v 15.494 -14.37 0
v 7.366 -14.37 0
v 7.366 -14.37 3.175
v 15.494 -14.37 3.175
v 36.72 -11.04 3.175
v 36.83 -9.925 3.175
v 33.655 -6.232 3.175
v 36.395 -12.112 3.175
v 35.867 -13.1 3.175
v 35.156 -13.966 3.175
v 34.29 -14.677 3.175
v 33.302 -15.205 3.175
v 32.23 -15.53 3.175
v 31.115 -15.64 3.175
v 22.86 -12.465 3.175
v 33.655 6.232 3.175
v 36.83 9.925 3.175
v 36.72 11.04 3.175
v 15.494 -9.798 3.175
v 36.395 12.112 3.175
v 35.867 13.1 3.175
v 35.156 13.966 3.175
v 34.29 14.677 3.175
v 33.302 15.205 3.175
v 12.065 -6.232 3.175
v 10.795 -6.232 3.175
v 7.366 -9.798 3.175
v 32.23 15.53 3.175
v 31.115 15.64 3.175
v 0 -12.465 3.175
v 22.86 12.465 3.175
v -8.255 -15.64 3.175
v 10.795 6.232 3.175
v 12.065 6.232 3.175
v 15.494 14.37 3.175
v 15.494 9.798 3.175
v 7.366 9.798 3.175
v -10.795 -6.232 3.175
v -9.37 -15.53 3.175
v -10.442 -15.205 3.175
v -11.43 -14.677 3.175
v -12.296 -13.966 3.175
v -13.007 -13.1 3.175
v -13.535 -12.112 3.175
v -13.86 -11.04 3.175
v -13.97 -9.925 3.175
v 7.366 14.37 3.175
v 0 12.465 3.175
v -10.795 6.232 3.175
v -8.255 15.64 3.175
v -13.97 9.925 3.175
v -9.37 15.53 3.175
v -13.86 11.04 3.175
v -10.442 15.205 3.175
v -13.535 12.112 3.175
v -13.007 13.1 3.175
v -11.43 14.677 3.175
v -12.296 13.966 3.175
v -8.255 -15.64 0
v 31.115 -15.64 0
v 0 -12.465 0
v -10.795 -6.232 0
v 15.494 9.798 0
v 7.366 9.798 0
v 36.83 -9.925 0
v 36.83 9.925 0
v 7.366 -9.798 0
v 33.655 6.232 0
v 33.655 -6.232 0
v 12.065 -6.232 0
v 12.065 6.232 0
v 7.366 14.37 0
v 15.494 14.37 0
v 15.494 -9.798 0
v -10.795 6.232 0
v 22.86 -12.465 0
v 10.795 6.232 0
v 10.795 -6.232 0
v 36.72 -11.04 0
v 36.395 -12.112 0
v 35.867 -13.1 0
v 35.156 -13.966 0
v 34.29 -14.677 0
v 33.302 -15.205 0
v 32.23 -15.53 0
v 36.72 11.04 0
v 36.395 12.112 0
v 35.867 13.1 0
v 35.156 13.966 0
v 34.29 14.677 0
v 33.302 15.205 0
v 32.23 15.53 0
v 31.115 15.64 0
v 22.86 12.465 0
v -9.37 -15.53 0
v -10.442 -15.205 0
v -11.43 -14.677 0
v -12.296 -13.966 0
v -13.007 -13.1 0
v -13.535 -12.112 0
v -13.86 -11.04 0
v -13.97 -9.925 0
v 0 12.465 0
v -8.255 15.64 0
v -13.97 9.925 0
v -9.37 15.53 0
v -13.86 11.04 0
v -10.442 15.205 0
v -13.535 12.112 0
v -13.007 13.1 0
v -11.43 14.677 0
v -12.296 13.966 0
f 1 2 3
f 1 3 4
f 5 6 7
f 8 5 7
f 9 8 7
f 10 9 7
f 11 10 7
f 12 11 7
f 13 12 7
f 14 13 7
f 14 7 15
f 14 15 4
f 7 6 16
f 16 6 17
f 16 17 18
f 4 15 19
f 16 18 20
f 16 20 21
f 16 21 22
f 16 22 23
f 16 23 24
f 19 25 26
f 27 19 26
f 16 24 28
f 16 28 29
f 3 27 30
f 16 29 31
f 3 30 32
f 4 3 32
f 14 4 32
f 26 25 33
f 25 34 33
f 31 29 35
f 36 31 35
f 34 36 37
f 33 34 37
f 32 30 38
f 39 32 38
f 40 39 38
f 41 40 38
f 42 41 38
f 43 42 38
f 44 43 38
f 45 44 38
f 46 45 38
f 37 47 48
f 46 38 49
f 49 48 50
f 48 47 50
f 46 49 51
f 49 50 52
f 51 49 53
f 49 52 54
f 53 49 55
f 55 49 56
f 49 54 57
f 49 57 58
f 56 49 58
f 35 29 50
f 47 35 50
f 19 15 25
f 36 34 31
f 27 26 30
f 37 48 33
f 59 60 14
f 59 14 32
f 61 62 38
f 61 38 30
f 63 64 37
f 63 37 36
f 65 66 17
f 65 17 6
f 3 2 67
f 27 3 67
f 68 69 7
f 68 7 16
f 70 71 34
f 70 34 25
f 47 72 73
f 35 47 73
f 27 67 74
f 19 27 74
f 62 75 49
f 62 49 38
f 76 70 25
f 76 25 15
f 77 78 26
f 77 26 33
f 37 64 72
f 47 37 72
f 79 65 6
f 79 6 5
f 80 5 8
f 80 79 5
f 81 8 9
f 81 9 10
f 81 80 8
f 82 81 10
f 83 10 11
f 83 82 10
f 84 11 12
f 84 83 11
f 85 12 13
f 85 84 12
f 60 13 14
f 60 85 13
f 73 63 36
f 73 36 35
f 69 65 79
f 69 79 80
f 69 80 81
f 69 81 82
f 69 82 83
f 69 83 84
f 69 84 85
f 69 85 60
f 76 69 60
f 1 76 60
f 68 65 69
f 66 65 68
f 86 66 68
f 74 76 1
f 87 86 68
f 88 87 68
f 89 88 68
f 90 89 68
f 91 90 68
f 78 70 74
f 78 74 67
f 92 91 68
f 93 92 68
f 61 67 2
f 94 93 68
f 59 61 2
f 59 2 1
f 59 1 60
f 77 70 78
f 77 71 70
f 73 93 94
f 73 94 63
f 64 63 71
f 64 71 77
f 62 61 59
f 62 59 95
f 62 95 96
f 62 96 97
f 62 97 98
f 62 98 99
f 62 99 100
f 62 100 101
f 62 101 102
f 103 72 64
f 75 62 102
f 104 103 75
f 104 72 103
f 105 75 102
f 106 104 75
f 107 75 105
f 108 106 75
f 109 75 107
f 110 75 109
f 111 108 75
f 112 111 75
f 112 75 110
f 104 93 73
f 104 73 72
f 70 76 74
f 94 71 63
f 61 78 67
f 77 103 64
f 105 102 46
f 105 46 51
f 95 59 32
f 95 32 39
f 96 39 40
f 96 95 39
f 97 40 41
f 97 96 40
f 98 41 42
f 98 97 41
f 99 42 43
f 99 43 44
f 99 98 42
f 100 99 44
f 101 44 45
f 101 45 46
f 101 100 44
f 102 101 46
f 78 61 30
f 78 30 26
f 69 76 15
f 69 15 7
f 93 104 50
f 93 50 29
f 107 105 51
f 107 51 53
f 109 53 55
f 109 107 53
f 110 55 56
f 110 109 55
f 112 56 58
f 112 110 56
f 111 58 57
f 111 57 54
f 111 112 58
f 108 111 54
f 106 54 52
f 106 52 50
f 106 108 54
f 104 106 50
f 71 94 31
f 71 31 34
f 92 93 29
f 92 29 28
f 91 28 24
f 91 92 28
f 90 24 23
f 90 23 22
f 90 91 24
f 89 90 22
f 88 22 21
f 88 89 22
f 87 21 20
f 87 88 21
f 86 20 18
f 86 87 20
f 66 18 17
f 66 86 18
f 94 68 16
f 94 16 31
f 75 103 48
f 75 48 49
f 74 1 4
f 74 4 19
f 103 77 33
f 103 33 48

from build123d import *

# Parameters (mm, degrees)
SKETCH1_W           = 8.128
SKETCH1_H           = 4.572
BOSS_EXTRUDE1_DEPTH = 3.175


with BuildPart() as part:
    # Sketch1 → Boss-Extrude1 (new body)
    with BuildSketch(Plane.XY):
        with BuildLine():
            Line((-8.255, 15.639992312), (31.115, 15.639992312))
            ThreePointArc((31.115, 15.639992312), (35.156115254, 13.966107566), (36.83, 9.924992312))
            Line((36.83, 9.924992312), (36.83, -9.924992312))
            ThreePointArc((36.83, -9.924992312), (35.156115254, -13.966107566), (31.115, -15.639992312))
            Line((31.115, -15.639992312), (-8.255, -15.639992312))
            ThreePointArc((-8.255, -15.639992312), (-12.296115254, -13.966107566), (-13.97, -9.924992312))
            Line((-13.97, -9.924992312), (-13.97, 9.924992312))
            ThreePointArc((-13.97, 9.924992312), (-12.296115254, 13.966107566), (-8.255, 15.639992312))
        make_face()
        Polygon((12.065, -6.232496156), (22.86, -12.464992312), (33.655, -6.232496156), (33.655, 6.232496156), (22.86, 12.464992312), (12.065, 6.232496156), align=None, mode=Mode.SUBTRACT)
        Polygon((-10.795, -6.232496156), (0, -12.464992312), (10.795, -6.232496156), (10.795, 6.232496156), (0, 12.464992312), (-10.795, 6.232496156), align=None, mode=Mode.SUBTRACT)
        with Locations((11.43, 12.083992312)):
            Rectangle(SKETCH1_W, SKETCH1_H, mode=Mode.SUBTRACT)
        with Locations((11.43, -12.083992312)):
            Rectangle(SKETCH1_W, SKETCH1_H, mode=Mode.SUBTRACT)
    extrude(amount=BOSS_EXTRUDE1_DEPTH)


solid = part.part
